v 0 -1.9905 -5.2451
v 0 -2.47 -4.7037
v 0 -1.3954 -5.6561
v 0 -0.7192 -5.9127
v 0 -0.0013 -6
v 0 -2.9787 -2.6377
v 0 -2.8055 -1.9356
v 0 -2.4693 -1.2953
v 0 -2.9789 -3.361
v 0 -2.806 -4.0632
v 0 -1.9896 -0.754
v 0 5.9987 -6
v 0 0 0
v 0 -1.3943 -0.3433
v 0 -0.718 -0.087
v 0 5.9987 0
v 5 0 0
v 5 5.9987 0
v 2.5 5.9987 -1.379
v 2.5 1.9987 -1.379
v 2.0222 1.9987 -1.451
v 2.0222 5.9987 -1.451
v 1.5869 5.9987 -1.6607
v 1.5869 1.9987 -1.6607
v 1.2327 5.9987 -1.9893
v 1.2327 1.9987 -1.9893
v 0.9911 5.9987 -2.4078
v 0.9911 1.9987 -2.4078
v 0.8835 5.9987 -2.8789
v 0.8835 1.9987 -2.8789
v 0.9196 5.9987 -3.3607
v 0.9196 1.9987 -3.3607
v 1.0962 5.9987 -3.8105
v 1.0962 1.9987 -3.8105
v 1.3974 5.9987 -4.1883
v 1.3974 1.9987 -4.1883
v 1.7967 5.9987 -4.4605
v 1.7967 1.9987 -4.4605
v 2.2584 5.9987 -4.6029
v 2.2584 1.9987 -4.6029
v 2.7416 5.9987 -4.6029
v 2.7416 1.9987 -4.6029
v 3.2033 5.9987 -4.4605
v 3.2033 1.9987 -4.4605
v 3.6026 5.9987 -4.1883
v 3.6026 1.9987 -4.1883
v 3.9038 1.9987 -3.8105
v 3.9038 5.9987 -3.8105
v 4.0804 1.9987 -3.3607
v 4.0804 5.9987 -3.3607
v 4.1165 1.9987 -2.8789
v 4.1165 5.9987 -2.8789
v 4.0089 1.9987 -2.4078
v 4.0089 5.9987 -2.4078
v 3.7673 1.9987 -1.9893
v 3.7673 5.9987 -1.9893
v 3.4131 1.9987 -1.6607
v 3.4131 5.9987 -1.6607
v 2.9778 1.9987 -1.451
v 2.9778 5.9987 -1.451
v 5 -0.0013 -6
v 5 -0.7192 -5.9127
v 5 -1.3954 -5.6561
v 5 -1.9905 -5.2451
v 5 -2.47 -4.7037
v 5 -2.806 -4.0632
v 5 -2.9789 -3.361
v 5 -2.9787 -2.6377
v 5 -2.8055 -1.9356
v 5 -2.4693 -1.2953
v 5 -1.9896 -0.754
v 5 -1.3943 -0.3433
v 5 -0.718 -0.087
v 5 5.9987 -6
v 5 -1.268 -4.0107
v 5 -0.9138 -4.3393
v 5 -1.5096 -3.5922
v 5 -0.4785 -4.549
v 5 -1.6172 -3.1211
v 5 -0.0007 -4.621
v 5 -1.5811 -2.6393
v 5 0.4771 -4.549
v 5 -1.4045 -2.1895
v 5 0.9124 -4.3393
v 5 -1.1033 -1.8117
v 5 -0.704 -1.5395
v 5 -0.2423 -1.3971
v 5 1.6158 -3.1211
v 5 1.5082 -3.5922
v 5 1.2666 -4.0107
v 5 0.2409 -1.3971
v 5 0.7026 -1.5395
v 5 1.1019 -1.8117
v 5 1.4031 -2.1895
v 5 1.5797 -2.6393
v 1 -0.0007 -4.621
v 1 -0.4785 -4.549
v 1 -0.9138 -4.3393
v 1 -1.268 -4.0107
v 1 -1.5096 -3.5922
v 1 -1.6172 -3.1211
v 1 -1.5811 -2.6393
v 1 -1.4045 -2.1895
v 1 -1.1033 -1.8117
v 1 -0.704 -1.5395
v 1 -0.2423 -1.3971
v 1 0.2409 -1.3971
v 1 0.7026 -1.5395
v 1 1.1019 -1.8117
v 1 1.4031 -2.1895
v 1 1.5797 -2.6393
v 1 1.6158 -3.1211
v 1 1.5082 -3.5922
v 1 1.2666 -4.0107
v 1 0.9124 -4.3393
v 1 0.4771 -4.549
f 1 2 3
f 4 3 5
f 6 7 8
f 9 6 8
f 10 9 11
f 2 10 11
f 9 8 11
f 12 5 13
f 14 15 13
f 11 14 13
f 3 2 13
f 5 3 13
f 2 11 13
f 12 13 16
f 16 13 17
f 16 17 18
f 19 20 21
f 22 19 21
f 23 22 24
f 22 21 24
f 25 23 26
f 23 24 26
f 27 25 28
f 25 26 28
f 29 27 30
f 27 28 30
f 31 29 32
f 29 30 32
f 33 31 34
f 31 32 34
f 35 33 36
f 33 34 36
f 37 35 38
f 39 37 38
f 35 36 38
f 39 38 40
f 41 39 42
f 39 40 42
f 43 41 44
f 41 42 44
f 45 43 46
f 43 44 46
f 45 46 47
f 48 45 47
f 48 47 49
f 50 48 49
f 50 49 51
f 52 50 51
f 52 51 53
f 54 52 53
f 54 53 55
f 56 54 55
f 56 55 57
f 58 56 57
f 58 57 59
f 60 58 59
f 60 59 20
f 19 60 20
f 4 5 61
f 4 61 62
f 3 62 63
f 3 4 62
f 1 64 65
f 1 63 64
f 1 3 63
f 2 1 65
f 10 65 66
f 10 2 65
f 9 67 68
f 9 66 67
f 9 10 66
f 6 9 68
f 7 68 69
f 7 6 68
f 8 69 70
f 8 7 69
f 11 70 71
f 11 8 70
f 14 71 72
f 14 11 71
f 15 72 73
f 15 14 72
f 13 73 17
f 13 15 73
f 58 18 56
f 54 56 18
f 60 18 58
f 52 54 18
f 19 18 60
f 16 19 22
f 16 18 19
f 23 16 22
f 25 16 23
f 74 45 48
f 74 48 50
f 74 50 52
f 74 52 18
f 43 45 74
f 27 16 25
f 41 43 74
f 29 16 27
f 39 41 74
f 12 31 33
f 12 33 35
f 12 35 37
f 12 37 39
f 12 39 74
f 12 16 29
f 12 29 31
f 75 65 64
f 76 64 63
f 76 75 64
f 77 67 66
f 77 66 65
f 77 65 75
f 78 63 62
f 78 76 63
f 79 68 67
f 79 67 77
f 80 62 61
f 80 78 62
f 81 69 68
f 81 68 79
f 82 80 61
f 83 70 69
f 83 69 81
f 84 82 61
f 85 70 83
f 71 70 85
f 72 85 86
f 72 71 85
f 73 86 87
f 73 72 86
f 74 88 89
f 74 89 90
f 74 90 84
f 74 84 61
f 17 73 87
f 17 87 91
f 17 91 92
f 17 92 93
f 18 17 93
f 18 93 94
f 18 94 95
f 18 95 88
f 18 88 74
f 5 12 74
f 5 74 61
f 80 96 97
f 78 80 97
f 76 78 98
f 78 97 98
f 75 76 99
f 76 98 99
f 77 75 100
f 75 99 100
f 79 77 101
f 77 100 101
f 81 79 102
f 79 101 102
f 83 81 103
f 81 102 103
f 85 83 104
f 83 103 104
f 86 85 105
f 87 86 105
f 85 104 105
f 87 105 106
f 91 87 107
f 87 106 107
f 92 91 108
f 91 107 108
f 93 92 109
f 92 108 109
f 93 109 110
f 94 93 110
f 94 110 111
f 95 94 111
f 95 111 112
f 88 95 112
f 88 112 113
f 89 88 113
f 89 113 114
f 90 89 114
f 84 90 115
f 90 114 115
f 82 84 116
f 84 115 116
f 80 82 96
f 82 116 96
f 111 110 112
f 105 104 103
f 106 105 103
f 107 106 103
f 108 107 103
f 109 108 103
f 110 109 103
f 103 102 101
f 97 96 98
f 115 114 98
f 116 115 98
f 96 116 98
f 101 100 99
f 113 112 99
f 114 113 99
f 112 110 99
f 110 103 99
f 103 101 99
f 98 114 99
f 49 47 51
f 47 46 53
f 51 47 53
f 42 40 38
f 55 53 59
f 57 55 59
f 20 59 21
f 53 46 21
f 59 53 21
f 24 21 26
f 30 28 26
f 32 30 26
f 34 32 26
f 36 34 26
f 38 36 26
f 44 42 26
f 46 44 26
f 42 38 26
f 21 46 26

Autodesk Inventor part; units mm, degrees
ref_plane "YZ Plane" through (0, 0, 0) normal (1, 0, 0) x (0, 1, 0)
ref_plane "XZ Plane" through (0, 0, 0) normal (0, 1, 0) x (-1, 0, 0)
ref_plane "XY Plane" through (0, 0, 0) normal (0, 0, 1) x (1, 0, 0)
sketch "Esboço1" plane through (0, 0, 0) normal (1, 0, 0) x (0, 1, 0)
  line L0 (0, 0) -> (5.9987, 0)
  line L1 (5.9987, 0) -> (5.9987, -6)
  line L2 (5.9987, -6) -> (-0.0013, -6)
  arc A0 (0, 0) -> (-0.0013, -6) centre (-0.0007, -3) ccw
  dimension "d0" = 6
  dimension "d1" = 6
  dimension "d3" = 3
extrude "Extrusão1" add sketch "Esboço1" along normal blind 5
sketch "Esboço2" plane through (5, 0, 0) normal (1, 0, 0) x (0, 0, -1)
  arc A0 (0, 0) -> (6, -0.0013) centre (3, -0.0007) ccw projected
hole "Furo1" at (5, -0.0007, -3) direction (-1, 0, 0) diameter 3.242 depth 4 thread size "M4x0.7" class "6H" standard "ANSI Metric M Profile"
sketch "Esboço3" plane through (0, 5.9987, 0) normal (0, 1, 0) x (1, 0, 0)
  line L0 (5, 0) -> (5, 6) projected
  line L1 (0, 6) -> (0, 0) projected
  point P0 (2.5, 3)
hole "Furo2" at (2.5, 5.9987, -3) direction (0, -1, 0) diameter 3.242 depth 4 thread size "M4x0.7" class "6H" standard "ANSI Metric M Profile"
properties part number "CONECTOR U-L"
